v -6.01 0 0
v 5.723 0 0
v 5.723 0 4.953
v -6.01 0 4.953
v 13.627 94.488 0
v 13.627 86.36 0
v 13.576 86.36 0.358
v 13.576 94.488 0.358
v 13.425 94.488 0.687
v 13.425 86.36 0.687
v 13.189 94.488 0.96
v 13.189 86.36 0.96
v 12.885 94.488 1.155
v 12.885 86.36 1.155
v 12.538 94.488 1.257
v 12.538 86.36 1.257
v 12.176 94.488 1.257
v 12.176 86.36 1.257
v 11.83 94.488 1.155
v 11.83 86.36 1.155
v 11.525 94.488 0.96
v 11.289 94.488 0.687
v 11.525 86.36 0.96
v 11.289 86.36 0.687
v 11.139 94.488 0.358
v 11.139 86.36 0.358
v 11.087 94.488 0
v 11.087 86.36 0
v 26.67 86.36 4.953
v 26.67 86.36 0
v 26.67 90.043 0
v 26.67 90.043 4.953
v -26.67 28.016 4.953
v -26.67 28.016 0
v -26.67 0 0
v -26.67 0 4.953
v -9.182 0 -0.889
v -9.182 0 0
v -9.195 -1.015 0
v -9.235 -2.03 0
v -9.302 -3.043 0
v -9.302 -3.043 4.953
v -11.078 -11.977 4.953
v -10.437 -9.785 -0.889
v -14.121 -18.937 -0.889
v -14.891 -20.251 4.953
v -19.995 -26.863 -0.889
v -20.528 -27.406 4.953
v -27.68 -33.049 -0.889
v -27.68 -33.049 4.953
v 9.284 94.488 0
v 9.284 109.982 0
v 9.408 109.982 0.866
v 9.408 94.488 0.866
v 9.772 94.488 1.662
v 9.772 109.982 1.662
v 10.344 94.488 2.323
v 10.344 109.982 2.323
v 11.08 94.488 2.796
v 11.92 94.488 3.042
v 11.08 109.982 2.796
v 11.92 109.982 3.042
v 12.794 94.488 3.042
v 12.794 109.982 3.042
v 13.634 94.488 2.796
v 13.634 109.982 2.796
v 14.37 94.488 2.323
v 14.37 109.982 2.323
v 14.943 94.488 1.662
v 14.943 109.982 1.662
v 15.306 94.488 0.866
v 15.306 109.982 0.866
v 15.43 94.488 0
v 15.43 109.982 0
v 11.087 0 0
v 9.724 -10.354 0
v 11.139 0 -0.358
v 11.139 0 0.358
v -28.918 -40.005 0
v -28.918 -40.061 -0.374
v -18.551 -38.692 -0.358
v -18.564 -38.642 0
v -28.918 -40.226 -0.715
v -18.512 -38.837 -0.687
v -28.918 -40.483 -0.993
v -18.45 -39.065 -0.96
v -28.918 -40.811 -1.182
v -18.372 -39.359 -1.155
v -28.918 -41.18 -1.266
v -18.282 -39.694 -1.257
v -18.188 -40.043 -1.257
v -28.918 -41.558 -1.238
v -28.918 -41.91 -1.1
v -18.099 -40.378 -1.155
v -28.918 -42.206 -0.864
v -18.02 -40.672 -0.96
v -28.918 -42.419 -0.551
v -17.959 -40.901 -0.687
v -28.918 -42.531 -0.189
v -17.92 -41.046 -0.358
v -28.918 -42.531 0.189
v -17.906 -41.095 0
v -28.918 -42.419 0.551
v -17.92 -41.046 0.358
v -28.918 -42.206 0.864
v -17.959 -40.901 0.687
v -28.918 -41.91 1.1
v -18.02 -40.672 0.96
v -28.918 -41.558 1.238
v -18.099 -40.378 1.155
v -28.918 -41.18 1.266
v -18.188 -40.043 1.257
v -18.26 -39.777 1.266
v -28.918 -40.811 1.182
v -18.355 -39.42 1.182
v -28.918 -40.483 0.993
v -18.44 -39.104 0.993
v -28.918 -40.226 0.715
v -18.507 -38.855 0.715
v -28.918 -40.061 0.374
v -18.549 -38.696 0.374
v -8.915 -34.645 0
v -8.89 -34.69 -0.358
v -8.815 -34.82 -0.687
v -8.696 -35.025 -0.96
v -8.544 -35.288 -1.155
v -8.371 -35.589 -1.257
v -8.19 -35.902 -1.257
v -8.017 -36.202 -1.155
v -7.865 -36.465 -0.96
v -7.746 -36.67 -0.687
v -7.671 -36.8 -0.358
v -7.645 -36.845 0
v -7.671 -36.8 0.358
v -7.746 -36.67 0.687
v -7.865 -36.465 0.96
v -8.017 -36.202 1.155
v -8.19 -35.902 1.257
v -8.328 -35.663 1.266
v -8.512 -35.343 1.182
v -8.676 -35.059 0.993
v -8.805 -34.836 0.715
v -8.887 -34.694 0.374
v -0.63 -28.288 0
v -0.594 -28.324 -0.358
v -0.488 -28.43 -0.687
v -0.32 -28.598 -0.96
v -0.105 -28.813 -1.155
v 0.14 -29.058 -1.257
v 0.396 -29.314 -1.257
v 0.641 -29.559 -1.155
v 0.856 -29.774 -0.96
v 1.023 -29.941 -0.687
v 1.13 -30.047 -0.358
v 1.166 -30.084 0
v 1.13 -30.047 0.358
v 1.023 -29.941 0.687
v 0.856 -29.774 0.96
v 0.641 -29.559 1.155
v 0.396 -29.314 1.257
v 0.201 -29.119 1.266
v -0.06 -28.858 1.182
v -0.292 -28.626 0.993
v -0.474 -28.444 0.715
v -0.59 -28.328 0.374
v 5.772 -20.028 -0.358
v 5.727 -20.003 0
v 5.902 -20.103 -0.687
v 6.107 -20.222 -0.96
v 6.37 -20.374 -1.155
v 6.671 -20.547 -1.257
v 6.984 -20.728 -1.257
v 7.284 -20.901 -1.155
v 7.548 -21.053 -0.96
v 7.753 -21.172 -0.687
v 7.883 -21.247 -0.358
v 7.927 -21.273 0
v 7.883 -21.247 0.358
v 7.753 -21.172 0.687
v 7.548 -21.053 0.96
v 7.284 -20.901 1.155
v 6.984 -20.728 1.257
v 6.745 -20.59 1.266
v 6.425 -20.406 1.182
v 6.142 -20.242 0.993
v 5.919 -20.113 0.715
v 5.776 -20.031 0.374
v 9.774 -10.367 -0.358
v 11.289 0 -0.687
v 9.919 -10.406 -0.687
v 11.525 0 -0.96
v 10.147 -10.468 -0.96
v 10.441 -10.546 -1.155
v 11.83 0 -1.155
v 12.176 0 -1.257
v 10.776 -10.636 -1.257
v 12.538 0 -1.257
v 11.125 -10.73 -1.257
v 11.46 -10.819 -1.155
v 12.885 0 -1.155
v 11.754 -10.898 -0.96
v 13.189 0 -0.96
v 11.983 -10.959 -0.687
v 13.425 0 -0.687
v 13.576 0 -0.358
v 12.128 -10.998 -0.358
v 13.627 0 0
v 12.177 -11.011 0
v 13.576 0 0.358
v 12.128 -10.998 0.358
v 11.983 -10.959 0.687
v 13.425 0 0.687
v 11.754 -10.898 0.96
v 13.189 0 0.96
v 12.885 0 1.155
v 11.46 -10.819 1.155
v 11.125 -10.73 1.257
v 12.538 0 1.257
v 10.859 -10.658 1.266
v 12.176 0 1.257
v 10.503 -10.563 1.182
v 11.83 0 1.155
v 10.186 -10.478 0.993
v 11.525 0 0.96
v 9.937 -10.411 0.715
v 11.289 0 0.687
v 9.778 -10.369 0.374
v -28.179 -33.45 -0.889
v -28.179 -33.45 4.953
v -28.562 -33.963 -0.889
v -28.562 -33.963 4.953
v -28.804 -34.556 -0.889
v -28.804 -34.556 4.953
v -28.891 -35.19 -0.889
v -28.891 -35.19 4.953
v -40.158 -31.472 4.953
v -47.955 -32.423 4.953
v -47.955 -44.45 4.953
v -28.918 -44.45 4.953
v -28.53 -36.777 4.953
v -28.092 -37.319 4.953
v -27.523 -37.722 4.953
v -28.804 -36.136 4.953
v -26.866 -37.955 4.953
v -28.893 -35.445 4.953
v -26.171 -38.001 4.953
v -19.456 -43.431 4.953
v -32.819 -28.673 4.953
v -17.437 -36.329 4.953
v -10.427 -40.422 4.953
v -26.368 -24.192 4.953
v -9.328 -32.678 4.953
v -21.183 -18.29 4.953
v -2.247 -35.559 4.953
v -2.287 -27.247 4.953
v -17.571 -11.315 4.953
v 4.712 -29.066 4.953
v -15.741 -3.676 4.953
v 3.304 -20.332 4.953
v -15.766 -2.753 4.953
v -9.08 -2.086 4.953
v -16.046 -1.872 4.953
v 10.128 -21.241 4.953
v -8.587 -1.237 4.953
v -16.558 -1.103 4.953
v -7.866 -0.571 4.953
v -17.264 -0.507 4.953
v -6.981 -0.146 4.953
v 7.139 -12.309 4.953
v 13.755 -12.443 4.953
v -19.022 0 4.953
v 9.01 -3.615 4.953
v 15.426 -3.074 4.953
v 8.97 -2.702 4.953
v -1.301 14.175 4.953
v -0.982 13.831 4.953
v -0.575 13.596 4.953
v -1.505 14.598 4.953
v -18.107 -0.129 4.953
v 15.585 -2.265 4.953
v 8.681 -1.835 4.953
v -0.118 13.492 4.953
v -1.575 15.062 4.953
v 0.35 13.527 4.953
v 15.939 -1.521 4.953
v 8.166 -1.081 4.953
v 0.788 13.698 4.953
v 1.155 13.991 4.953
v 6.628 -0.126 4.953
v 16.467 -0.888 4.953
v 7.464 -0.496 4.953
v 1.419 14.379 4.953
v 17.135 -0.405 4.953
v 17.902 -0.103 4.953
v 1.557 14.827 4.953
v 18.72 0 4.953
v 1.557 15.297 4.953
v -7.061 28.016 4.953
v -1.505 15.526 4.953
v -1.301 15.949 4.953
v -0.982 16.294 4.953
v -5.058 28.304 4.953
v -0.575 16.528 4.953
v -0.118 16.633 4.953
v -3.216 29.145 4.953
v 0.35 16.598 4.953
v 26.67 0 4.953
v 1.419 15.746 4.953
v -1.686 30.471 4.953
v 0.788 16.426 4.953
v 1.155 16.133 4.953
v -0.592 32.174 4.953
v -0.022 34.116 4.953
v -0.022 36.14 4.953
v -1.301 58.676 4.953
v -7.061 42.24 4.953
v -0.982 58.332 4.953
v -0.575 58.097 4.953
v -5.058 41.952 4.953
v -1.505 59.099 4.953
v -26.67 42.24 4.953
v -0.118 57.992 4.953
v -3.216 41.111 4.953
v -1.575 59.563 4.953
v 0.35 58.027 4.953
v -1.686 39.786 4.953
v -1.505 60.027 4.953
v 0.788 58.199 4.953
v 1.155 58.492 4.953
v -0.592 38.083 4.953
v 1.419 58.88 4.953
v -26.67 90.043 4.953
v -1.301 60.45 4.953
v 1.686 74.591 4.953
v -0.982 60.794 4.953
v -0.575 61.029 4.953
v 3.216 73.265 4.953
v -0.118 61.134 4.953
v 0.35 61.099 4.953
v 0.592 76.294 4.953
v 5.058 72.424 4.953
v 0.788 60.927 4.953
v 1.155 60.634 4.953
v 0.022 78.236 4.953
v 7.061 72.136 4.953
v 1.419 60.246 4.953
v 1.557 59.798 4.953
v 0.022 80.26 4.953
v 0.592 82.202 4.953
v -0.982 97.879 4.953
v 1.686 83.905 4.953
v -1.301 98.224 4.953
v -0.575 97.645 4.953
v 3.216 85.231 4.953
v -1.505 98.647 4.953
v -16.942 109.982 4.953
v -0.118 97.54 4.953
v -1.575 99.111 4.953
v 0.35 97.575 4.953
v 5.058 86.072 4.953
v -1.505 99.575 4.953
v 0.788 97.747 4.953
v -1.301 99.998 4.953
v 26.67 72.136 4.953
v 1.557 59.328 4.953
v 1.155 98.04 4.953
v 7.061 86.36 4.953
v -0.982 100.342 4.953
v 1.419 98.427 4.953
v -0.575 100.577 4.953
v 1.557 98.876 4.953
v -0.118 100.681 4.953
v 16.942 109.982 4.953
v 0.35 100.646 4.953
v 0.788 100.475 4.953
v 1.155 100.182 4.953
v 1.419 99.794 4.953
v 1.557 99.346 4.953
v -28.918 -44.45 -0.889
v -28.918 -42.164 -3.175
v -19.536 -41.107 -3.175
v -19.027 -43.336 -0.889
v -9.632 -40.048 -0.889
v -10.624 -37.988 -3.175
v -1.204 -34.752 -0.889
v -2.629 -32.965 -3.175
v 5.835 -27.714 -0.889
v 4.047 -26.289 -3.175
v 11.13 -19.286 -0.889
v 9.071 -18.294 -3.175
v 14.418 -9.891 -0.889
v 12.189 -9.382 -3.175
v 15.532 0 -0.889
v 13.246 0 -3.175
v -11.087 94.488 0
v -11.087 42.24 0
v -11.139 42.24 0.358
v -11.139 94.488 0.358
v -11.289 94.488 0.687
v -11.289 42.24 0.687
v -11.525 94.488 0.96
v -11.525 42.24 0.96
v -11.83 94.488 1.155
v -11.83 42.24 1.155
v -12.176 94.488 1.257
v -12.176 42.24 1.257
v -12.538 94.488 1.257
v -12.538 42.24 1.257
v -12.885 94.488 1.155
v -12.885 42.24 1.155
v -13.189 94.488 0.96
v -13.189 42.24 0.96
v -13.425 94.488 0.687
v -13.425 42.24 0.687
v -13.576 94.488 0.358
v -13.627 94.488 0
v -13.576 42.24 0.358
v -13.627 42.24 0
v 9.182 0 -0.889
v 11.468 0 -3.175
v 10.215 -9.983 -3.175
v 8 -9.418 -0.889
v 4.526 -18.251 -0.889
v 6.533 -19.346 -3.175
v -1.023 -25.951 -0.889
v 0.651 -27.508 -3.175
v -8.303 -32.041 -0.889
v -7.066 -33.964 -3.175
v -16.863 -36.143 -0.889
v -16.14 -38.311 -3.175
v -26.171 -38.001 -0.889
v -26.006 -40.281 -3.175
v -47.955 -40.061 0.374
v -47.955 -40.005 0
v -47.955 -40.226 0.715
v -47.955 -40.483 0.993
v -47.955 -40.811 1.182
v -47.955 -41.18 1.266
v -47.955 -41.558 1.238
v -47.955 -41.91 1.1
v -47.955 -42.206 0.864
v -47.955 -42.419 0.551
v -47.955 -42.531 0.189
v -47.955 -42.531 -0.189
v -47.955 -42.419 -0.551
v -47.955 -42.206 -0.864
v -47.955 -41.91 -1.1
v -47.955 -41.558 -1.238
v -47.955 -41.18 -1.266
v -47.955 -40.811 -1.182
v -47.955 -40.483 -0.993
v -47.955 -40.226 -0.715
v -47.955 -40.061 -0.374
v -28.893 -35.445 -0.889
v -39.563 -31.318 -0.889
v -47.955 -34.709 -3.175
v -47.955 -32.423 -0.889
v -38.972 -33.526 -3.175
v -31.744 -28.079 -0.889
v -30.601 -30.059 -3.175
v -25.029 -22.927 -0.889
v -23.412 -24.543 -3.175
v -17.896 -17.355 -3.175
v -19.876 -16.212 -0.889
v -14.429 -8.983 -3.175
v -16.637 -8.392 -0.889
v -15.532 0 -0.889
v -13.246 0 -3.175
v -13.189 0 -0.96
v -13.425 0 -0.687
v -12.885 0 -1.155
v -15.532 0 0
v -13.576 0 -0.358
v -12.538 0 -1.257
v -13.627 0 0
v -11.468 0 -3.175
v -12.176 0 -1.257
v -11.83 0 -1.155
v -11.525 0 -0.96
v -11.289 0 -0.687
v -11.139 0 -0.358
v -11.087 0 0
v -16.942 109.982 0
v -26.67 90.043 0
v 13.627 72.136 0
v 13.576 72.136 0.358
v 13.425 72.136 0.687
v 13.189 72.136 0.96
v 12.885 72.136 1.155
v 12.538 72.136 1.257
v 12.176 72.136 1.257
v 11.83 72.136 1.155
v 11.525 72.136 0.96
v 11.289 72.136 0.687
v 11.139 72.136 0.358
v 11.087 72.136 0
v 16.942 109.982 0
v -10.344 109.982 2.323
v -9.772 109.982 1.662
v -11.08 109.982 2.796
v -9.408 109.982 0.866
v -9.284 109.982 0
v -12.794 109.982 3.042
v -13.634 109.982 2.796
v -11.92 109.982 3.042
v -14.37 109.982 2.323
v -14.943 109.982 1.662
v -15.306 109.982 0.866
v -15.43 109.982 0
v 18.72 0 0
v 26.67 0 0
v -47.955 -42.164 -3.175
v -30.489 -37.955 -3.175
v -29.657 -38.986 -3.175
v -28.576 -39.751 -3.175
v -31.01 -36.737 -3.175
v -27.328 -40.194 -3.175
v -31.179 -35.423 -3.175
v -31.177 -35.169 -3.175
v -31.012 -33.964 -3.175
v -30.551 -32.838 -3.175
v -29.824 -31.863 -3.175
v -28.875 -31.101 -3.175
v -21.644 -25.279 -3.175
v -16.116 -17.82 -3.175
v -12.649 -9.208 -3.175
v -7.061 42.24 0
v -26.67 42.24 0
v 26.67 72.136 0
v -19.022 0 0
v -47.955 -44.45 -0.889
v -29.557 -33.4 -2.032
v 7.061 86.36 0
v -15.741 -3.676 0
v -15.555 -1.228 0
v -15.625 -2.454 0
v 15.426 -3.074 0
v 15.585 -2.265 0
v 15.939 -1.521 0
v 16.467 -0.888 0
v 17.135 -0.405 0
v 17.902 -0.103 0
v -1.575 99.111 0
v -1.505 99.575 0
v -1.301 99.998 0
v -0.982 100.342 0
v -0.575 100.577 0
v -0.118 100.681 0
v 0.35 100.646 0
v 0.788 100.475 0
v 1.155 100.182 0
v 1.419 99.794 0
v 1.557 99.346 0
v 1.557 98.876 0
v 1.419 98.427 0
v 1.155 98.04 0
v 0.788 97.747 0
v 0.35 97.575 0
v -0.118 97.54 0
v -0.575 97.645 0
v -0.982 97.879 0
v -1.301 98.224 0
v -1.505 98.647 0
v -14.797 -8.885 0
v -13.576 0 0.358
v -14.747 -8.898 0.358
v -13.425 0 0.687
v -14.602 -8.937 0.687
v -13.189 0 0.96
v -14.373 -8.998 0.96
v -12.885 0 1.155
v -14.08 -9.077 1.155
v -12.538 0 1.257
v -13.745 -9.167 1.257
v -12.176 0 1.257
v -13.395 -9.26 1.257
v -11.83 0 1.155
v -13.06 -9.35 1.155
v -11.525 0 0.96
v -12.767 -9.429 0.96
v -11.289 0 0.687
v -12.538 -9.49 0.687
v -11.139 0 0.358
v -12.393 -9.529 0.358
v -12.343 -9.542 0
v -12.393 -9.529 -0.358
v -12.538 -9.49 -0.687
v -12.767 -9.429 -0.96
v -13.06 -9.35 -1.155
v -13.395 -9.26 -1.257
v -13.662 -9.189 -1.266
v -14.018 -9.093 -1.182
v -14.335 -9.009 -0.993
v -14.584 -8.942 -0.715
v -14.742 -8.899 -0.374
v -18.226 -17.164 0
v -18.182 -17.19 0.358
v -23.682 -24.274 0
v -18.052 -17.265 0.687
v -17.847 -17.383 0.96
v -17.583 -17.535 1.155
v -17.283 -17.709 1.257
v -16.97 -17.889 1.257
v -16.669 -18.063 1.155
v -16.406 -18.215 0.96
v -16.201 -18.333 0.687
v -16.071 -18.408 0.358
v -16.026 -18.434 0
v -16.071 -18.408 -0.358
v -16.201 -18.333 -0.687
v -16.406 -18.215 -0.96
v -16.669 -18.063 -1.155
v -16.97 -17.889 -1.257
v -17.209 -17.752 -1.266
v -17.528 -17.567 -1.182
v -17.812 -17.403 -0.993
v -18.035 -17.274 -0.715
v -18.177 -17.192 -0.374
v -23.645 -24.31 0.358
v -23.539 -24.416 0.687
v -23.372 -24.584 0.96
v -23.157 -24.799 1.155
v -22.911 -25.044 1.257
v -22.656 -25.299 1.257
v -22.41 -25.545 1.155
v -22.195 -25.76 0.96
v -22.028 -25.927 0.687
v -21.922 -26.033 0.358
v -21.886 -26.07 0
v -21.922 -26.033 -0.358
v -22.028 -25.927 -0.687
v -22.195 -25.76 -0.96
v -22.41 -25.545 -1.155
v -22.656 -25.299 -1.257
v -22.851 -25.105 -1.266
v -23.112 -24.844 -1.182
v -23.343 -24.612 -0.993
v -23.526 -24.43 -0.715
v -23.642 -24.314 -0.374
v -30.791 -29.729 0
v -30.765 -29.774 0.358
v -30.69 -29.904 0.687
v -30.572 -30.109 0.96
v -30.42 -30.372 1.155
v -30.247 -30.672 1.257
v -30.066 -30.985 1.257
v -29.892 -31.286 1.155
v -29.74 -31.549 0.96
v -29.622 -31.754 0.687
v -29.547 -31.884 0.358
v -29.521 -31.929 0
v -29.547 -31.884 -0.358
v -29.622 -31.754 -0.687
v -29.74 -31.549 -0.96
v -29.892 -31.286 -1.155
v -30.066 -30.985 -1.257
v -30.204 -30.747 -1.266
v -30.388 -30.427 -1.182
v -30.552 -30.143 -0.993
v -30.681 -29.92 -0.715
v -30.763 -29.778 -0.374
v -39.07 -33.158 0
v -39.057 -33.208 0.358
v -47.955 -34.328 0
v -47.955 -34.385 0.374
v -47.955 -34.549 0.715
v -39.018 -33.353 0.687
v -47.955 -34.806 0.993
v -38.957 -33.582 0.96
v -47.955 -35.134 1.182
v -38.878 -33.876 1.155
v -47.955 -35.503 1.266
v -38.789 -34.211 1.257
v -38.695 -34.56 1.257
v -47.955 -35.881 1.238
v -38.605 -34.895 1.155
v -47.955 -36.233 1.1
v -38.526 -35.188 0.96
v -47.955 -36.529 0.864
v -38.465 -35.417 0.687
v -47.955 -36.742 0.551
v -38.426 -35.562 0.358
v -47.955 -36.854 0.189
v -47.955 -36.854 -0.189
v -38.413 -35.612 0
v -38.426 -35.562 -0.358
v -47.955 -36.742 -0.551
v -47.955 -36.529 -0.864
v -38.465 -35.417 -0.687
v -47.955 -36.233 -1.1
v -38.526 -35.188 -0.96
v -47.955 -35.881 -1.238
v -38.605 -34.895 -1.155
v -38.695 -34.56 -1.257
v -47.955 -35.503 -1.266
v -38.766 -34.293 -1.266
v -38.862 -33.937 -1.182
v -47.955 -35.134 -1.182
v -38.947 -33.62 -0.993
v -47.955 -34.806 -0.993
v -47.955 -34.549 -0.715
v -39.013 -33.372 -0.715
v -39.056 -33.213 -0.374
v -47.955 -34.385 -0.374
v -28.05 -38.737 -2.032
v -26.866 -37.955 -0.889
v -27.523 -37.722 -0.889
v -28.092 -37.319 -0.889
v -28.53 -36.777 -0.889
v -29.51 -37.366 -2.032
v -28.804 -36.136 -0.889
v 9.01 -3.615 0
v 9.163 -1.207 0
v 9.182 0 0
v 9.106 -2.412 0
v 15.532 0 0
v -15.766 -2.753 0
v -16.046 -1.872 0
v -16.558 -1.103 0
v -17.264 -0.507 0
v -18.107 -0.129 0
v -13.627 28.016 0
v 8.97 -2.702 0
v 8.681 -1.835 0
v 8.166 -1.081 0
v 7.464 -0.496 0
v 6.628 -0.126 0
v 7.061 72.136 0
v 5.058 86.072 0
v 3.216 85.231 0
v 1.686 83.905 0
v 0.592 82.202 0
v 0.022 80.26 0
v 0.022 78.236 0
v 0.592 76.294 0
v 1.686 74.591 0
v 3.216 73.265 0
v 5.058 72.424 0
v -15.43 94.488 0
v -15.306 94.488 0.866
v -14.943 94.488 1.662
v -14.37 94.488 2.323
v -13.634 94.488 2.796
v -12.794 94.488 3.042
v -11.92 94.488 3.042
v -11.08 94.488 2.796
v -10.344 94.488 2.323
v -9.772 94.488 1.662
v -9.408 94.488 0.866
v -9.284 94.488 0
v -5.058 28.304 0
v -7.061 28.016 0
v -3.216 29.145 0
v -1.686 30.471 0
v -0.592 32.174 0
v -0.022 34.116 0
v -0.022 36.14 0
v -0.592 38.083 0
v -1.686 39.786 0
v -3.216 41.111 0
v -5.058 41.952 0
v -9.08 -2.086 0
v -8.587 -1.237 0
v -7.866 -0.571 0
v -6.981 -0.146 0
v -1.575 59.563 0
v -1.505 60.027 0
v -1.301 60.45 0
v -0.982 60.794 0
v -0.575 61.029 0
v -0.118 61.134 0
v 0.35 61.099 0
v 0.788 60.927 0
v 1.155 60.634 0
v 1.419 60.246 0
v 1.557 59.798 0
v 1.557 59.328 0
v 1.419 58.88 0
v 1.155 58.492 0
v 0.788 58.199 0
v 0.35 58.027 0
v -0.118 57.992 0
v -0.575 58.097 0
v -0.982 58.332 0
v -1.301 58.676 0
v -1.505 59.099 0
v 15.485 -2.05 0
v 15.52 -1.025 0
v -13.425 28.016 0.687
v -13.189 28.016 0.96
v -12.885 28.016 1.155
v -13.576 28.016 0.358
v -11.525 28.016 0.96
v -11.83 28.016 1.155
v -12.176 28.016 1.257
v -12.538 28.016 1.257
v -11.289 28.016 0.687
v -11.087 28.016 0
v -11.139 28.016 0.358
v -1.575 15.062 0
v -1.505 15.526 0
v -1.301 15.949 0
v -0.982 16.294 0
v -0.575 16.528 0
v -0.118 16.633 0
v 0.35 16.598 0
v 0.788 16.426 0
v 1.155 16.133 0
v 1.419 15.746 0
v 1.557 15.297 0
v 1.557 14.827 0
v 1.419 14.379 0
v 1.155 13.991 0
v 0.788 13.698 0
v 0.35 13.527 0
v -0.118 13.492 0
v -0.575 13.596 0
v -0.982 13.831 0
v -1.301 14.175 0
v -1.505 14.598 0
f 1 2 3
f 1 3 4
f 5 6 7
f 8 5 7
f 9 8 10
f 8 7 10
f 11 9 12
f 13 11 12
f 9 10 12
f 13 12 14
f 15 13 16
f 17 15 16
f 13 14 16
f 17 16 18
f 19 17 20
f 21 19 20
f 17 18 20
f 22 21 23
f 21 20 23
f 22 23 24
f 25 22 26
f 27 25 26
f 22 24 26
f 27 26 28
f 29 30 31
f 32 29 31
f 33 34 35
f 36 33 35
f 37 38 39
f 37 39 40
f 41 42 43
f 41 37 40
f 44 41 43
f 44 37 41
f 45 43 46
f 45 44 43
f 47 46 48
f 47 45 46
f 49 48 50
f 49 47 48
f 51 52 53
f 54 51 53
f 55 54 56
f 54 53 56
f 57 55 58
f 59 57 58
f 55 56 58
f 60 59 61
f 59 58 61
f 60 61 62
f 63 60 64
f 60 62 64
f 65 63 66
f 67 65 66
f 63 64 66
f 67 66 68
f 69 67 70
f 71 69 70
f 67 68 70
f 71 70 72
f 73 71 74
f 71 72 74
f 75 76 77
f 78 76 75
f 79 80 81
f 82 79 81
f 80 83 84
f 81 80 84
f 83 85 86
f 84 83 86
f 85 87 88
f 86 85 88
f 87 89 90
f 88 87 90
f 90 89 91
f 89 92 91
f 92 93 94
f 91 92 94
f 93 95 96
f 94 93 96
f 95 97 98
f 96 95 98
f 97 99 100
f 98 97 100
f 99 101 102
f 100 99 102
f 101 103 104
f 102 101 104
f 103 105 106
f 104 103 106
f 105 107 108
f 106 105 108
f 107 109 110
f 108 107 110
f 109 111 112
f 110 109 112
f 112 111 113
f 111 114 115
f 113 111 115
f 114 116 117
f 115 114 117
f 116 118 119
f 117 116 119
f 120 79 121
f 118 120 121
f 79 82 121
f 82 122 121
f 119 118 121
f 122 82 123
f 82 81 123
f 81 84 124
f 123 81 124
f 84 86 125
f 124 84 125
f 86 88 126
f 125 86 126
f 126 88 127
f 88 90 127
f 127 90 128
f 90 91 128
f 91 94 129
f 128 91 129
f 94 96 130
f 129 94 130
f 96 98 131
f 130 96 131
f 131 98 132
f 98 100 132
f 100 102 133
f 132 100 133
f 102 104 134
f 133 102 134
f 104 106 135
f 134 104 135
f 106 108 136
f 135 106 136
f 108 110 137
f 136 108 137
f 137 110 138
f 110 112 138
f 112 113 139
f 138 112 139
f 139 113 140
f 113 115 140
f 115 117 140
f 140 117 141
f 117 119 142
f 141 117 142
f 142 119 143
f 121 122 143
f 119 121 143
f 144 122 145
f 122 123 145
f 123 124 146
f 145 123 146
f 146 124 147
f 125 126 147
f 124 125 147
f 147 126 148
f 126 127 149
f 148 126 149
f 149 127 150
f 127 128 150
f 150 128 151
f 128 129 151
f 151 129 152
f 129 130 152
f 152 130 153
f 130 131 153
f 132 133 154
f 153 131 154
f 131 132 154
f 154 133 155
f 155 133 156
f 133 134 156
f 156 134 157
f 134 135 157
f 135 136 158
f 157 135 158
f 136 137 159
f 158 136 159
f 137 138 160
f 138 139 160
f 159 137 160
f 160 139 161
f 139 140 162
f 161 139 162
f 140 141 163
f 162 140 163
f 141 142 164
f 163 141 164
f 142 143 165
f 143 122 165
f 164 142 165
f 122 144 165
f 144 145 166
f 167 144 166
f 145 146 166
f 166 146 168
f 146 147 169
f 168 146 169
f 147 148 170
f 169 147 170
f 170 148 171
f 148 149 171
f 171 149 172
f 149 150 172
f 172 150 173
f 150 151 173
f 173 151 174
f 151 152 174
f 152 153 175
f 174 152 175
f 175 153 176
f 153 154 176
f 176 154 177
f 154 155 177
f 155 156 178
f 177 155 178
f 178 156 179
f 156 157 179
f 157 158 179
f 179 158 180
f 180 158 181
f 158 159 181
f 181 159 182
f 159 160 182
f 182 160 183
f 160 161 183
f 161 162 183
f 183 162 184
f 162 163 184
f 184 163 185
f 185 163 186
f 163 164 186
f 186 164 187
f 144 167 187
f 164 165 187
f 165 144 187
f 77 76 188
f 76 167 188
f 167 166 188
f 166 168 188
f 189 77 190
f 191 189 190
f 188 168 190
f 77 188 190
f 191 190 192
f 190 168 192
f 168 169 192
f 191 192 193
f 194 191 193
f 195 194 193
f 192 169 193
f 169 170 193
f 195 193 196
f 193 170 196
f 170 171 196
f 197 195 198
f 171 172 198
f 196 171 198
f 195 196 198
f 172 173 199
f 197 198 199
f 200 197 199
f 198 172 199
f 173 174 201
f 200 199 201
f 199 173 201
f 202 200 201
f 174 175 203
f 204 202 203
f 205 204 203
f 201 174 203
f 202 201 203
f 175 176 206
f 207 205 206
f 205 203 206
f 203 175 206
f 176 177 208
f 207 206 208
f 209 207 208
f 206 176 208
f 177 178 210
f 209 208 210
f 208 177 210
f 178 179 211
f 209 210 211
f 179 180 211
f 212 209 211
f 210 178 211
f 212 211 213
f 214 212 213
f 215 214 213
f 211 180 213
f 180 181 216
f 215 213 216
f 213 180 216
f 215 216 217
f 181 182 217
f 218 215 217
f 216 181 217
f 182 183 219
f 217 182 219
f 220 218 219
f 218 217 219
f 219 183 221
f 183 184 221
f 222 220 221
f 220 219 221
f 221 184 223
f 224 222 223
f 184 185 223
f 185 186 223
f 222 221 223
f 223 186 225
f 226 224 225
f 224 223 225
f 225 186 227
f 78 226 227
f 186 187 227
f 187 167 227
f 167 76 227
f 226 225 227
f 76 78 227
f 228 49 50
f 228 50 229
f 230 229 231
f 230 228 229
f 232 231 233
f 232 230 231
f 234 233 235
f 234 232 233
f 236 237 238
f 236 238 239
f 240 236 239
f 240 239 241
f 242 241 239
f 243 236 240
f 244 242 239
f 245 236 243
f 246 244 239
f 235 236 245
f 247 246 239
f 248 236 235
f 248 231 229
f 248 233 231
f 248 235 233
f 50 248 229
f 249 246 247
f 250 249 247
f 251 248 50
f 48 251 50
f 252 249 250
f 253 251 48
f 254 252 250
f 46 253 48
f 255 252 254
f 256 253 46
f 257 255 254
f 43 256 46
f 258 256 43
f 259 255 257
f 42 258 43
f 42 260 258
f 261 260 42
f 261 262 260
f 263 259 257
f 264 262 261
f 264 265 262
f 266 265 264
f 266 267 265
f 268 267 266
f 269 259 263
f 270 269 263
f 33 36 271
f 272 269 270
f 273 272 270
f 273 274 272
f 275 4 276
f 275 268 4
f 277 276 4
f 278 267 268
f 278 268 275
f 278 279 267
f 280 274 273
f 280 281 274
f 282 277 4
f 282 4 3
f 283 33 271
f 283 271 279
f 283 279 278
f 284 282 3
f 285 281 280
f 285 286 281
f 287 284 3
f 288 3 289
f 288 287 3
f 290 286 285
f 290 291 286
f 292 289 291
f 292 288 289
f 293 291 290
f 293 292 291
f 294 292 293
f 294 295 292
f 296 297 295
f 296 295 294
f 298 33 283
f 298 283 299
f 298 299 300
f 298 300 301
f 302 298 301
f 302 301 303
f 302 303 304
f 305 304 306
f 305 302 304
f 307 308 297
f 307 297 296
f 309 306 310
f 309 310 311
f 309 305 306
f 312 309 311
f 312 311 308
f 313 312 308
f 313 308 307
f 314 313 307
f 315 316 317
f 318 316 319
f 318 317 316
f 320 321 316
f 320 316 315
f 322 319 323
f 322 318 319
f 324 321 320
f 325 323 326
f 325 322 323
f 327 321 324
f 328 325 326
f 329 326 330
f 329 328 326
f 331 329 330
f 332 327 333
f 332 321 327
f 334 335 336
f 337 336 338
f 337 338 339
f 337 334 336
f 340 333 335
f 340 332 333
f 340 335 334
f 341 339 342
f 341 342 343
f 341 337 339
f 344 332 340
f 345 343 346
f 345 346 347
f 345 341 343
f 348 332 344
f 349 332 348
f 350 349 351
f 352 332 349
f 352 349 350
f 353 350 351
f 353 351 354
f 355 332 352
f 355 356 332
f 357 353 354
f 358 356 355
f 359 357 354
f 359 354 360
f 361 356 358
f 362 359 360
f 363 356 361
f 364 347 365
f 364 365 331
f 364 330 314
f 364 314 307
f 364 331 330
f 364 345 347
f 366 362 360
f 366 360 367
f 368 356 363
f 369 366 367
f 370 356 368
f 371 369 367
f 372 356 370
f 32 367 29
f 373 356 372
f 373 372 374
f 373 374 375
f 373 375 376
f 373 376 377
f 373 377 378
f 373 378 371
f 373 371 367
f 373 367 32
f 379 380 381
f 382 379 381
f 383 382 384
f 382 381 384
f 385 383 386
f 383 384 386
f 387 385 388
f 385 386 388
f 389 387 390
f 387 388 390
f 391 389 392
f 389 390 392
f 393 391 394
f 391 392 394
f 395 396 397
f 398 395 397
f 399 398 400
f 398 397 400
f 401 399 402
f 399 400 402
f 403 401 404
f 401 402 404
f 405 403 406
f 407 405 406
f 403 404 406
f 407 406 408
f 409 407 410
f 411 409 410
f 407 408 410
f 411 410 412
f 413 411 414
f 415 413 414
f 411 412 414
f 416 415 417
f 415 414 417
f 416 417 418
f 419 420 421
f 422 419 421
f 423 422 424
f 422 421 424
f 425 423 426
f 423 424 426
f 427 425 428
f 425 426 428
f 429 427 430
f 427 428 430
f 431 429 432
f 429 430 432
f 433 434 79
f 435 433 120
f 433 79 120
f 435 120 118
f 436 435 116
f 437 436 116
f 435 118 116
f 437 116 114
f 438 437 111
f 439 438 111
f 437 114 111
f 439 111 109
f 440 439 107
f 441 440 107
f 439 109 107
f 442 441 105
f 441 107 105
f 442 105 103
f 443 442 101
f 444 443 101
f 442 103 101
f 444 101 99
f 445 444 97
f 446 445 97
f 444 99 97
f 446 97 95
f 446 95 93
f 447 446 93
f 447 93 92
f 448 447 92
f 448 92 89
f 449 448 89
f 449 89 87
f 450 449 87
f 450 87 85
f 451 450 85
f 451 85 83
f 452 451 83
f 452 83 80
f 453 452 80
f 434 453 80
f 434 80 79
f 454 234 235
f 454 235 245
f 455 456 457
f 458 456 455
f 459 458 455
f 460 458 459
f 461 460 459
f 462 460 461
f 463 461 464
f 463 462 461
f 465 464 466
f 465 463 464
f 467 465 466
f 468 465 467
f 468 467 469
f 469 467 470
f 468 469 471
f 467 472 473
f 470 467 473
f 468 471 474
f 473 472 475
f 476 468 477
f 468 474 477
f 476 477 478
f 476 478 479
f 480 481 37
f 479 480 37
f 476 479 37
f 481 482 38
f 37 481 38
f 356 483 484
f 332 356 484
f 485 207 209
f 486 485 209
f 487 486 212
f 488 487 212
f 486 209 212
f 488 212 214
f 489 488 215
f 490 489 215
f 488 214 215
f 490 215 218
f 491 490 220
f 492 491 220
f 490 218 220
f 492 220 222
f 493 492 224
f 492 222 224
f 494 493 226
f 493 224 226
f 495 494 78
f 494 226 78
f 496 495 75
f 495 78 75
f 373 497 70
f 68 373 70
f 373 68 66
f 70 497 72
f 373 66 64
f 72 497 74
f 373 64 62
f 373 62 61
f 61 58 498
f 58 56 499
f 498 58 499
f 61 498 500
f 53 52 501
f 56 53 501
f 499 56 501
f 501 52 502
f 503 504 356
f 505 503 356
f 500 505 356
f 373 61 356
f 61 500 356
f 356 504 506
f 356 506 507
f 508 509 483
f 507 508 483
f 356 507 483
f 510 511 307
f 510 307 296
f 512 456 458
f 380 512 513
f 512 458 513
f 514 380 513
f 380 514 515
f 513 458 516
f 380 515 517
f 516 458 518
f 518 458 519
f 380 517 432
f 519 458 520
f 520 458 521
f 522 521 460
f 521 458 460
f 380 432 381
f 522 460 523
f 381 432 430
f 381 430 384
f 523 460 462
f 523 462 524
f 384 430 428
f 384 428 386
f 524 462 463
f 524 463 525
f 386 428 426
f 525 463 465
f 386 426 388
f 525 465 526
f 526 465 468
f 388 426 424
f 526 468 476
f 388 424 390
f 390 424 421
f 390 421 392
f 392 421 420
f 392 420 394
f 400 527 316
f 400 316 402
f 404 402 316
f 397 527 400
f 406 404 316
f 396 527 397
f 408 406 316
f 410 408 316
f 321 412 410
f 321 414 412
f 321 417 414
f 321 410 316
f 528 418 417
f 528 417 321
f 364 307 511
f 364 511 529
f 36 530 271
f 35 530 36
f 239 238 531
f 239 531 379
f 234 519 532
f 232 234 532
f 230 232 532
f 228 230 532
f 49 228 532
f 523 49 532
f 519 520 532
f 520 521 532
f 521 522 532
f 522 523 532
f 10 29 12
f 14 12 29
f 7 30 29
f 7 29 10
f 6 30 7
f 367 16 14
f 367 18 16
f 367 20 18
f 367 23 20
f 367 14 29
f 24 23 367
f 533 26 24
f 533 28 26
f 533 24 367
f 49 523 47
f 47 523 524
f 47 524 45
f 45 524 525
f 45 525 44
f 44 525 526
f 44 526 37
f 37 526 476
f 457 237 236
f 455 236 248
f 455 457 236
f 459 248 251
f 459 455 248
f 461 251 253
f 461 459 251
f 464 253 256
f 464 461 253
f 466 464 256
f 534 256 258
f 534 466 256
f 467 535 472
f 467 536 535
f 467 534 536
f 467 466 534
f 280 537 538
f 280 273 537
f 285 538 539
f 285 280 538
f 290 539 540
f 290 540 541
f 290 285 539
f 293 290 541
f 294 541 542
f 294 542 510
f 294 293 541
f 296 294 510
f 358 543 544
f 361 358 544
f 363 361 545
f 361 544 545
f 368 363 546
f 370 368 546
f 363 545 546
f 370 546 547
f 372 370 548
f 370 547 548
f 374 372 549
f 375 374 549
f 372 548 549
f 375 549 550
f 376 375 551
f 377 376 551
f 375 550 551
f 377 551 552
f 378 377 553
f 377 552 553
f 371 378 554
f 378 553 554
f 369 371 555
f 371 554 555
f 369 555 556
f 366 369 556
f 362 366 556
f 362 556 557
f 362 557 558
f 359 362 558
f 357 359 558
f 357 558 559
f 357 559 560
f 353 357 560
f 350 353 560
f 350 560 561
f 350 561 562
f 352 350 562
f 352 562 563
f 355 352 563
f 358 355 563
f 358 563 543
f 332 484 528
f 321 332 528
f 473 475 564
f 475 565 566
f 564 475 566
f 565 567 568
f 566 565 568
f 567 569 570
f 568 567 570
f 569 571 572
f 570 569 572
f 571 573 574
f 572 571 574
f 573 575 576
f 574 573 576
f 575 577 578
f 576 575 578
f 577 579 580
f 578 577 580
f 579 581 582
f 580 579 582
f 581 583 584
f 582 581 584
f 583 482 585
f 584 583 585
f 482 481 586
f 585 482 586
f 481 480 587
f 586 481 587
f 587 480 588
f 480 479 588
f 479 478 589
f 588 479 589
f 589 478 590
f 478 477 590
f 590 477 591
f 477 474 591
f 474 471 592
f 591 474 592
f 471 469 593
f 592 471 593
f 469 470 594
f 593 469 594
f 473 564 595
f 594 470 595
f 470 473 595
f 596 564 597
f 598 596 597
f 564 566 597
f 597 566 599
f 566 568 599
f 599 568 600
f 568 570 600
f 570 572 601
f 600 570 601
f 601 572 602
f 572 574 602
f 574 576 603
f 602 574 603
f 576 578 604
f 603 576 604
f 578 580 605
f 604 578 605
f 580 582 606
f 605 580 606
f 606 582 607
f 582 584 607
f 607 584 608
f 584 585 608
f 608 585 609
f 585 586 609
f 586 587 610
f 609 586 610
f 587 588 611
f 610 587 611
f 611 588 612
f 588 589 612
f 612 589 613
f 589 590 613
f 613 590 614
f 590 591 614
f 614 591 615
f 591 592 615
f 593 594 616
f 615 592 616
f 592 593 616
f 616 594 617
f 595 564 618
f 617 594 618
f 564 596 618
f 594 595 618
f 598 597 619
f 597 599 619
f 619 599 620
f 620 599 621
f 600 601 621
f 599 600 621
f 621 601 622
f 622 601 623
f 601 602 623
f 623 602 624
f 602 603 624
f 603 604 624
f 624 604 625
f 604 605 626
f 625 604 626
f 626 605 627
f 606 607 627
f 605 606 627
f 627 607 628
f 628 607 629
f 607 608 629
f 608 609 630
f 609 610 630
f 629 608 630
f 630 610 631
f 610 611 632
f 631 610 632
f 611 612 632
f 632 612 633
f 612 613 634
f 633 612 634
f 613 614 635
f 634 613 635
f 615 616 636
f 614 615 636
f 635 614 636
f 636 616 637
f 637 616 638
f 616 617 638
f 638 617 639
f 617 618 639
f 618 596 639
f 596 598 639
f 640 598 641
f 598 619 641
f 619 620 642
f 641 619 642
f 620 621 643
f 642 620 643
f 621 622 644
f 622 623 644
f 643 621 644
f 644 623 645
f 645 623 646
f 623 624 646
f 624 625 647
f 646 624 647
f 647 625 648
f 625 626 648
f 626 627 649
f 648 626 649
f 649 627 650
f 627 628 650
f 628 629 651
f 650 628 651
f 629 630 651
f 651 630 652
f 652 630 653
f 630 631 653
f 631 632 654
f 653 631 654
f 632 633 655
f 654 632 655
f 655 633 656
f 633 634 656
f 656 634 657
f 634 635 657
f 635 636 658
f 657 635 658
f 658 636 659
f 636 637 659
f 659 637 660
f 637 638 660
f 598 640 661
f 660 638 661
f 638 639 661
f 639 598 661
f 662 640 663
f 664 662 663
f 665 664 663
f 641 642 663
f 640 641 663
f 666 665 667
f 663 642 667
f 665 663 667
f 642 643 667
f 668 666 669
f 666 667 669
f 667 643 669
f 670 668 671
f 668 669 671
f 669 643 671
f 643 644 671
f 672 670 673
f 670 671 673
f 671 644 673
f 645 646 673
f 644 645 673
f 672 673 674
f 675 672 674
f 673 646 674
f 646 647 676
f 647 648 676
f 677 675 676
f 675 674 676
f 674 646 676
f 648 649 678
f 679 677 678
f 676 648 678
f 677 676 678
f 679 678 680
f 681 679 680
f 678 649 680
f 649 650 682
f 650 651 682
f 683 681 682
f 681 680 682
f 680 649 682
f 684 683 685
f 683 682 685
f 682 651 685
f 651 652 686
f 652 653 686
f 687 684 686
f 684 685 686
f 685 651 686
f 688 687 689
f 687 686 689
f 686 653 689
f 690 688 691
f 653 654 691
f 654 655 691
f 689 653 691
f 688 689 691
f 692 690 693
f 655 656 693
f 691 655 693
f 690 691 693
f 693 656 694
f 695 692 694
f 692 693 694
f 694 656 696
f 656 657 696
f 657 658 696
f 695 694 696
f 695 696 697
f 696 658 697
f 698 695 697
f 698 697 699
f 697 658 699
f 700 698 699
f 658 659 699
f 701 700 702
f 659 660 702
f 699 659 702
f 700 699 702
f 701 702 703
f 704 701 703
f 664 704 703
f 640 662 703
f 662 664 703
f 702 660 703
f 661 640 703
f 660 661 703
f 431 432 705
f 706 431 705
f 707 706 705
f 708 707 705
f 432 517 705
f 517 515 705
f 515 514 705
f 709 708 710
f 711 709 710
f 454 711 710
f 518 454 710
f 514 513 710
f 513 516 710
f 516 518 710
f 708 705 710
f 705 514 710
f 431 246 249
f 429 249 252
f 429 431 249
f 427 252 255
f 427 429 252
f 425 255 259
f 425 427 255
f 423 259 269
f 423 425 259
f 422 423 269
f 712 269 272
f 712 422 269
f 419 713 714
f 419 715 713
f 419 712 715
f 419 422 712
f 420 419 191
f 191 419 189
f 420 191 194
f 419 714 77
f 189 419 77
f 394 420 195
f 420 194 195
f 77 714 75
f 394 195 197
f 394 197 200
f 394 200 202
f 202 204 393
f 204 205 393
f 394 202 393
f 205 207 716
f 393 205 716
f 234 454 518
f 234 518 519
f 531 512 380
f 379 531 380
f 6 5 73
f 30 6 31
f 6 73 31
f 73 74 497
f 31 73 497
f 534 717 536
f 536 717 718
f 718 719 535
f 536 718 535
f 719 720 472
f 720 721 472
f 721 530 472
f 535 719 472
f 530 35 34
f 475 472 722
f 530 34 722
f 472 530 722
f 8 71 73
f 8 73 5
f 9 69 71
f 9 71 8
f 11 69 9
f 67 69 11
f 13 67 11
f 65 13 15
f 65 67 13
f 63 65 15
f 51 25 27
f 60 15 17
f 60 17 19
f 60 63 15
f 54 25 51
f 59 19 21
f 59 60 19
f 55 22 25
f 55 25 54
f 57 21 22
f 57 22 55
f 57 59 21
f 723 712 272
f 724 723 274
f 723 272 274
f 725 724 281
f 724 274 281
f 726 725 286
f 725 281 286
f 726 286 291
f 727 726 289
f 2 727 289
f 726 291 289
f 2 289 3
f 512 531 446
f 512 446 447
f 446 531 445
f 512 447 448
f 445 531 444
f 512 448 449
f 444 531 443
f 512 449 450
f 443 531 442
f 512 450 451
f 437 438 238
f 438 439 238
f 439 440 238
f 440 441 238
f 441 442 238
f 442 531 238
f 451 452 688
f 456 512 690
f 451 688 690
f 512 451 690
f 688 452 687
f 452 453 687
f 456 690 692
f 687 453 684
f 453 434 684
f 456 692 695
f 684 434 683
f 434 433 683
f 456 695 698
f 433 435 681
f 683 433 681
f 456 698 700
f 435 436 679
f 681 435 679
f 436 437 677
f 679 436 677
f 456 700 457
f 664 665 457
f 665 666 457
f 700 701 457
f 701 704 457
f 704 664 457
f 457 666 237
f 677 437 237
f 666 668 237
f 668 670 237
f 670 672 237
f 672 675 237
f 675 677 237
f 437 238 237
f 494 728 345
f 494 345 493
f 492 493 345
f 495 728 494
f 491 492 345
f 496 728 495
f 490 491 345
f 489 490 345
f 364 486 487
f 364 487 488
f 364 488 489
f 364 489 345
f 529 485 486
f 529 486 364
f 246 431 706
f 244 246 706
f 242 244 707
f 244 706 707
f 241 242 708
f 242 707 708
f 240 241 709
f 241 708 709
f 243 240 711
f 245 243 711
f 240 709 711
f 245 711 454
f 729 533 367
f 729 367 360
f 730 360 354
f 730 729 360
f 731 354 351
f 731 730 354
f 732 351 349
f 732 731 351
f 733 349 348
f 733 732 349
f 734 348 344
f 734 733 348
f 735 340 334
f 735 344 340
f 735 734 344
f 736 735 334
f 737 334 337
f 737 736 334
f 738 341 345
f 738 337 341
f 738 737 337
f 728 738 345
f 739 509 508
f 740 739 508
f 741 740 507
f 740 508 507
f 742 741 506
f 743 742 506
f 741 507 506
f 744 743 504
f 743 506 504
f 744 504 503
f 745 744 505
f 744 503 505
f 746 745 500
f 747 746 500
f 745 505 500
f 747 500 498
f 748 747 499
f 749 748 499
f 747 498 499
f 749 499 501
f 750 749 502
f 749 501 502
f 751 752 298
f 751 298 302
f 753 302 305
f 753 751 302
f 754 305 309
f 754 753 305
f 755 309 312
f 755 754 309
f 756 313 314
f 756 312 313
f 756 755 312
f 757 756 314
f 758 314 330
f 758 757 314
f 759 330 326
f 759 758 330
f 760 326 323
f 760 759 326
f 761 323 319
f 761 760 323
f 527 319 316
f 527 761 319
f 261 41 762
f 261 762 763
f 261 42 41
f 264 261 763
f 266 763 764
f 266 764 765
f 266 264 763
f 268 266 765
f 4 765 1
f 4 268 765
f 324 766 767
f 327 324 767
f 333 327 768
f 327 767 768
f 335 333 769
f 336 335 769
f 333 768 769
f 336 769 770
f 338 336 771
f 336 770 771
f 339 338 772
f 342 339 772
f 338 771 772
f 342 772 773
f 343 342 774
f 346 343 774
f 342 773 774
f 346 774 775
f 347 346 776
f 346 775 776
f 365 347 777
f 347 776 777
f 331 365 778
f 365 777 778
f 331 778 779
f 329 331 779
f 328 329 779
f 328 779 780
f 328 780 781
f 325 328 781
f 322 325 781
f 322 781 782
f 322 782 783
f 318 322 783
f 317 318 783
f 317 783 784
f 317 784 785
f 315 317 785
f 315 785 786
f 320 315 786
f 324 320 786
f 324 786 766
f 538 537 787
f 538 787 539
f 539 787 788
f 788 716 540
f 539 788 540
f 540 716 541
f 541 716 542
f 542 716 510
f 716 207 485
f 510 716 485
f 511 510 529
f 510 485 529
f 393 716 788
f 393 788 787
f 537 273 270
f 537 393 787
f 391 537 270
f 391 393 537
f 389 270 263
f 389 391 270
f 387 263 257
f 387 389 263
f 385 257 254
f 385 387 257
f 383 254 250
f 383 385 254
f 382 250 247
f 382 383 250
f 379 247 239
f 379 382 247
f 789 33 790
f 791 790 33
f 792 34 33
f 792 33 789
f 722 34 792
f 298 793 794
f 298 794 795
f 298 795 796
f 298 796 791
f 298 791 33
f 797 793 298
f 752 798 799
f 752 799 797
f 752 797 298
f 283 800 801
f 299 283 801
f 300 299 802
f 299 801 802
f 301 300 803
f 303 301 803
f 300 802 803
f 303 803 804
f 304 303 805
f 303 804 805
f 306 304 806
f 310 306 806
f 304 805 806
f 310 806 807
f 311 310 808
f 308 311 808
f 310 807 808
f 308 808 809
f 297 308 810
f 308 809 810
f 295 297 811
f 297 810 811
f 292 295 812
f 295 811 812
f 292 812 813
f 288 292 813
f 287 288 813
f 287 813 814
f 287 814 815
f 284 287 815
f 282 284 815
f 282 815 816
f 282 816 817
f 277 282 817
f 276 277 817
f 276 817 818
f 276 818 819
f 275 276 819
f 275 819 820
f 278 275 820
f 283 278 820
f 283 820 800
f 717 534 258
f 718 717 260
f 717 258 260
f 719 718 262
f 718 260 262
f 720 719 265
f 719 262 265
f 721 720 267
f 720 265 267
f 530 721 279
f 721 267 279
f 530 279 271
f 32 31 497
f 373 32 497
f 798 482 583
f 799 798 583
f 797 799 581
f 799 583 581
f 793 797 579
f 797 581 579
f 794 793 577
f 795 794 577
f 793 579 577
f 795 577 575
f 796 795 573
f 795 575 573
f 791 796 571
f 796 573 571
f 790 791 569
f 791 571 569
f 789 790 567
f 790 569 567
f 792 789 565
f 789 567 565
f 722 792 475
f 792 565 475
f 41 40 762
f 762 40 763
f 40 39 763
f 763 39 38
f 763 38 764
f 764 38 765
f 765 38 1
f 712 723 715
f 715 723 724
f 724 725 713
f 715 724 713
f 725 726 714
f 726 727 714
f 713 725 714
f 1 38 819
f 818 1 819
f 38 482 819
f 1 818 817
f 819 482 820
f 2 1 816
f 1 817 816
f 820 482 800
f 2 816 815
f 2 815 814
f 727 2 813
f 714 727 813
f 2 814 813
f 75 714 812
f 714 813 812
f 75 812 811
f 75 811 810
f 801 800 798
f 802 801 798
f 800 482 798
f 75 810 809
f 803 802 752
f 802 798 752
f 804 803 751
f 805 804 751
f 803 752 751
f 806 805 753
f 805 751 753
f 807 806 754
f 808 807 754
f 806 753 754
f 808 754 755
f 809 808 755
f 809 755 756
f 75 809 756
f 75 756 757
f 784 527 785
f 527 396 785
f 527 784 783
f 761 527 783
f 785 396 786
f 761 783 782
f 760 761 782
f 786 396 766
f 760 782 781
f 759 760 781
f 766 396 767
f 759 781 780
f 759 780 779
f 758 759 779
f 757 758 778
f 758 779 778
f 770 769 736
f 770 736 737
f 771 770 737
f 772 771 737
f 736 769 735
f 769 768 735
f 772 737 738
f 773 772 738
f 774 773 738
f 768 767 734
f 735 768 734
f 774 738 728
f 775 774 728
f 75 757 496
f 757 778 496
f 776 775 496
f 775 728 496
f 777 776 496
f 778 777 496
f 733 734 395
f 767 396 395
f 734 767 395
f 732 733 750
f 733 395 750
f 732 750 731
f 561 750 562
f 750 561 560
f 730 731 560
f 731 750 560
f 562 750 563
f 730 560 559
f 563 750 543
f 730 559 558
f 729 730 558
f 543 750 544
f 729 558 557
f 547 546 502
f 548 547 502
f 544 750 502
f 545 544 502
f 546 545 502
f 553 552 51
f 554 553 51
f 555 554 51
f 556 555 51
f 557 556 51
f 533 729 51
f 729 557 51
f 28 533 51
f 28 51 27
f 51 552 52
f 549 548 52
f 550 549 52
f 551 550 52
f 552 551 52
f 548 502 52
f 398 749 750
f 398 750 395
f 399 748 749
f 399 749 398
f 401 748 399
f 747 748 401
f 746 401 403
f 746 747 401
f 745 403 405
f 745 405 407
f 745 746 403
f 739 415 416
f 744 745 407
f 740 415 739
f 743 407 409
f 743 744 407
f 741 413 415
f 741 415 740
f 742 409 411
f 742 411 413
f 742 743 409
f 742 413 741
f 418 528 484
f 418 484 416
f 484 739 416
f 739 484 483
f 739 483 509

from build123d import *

# Parameters (mm, degrees)
F1_DEPTH       = 4.953
F3_DEPTH       = 4.954
F5_DEPTH       = 109.983
F7_DEPTH       = 15.494
F8_W           = 74.6252
F8_H           = 44.45
F9_DEPTH       = 4.953
F9_DEPTH_BACK  = 3.175
F11_R          = 1.27
F17_DEPTH      = 3.176
F17_DEPTH_BACK = 4.954
F19_D          = 3.15
F20_R          = 3.302
F21_R          = 2.5393938838
F22_SIZE       = 2.286


# Not quite as in the source:
# - a feature names something its author has since deleted; it is built from what else it names


with BuildPart() as f1:
    # F0 (on Top) → F1 (new body)
    with BuildSketch(Plane.XY):
        Polygon((-26.67, 0), (26.67, 0), (26.67, 90.043), (16.9418, 109.982), (-16.9418, 109.982), (-26.67, 90.043), align=None)
    extrude(amount=F1_DEPTH)

    # F2 (on Top) → F3 (cut, through all)
    with BuildSketch(Plane.XY):
        with BuildLine():
            Line((-26.67, 28.0162), (-7.0612, 28.0162))
            ThreePointArc((-7.0612, 28.0162), (0.0508, 35.1282), (-7.0612, 42.2402))
            Line((-7.0612, 42.2402), (-26.67, 42.2402))
            Line((-26.67, 42.2402), (-26.67, 28.0162))
        make_face()
        with BuildLine():
            Line((26.67, 86.36), (7.0612, 86.36))
            ThreePointArc((7.0612, 86.36), (-0.0508, 79.248), (7.0612, 72.136))
            Line((7.0612, 72.136), (26.67, 72.136))
            Line((26.67, 72.136), (26.67, 86.36))
        make_face()
    extrude(amount=F3_DEPTH, mode=Mode.SUBTRACT)

    # F4 (on face) → F5 (cut, through all)
    with BuildSketch(Plane.XZ):
        with BuildLine():
            ThreePointArc((-11.0871, 0), (-12.3571, 1.27), (-13.6271, 0))
            Line((-13.6271, 0), (-11.0871, 0))
        make_face()
        with BuildLine():
            ThreePointArc((13.6271, 0), (12.3571, 1.27), (11.0871, 0))
            Line((11.0871, 0), (13.6271, 0))
        make_face()
    extrude(amount=-F5_DEPTH, mode=Mode.SUBTRACT)

    # F6 (on face) → F7 (cut)
    with BuildSketch(Plane(origin=(0, 109.982, 0), x_dir=(-1, 0, 0), z_dir=(0, 1, 0))):
        with BuildLine():
            ThreePointArc((-9.2837, 0), (-12.3571, 3.0734), (-15.4305, 0))
            Line((-15.4305, 0), (-9.2837, 0))
        make_face()
        with BuildLine():
            ThreePointArc((15.4305, 0), (12.3571, 3.0734), (9.2837, 0))
            Line((9.2837, 0), (15.4305, 0))
        make_face()
    extrude(amount=-F7_DEPTH, mode=Mode.SUBTRACT)

    # F8 (on Top) → F9 (join, two sides)
    with BuildSketch(Plane.XY) as f9_sk:
        with Locations((-10.6426, -22.225)):
            Rectangle(F8_W, F8_H)
    extrude(amount=F9_DEPTH)
    extrude(f9_sk.sketch, amount=-F9_DEPTH_BACK)

    # F12: sweep along a path in F10
    with BuildLine(Plane.XY) as f12_path:
        Line((-47.9552, -41.275), (-28.9179, -41.275))
        ThreePointArc((-28.9179, -41.275), (0.2679323935, -29.1858323935), (12.3571, 0))
    # F11 (on face) → F12 (sweep, cut)
    with BuildSketch(Plane(origin=(0, 0, 0), x_dir=(-1, 0, 0), z_dir=(0, 1, 0))):
        with Locations((-12.3571, 0)):
            Circle(F11_R)
    sweep(path=f12_path.line, mode=Mode.SUBTRACT)

    # F15: sweep along a path in F13
    with BuildLine(Plane.XY) as f15_path:
        ThreePointArc((-12.3571, 0), (-22.7835420926, -25.1716579074), (-47.9552, -35.5981))
    # F14 (on face) → F15 (sweep, cut)
    with BuildSketch(Plane(origin=(0, 0, 0), x_dir=(-1, 0, 0), z_dir=(0, 1, 0))):
        with BuildLine():
            ThreePointArc((11.0871, 0), (12.3571, -1.27), (13.6271, 0))
            ThreePointArc((13.6271, 0), (12.3571, 1.27), (11.0871, 0))
        make_face()
    sweep(path=f15_path.line, mode=Mode.SUBTRACT)

    # F16 (on Top) → F17 (cut, two sides)
    with BuildSketch(Plane.XY) as f17_sk:
        with BuildLine():
            Line((-28.9179, -44.45), (26.67, -44.45))
            Line((26.67, -44.45), (26.67, 0))
            Line((26.67, 0), (15.5321, 0))
            ThreePointArc((15.5321, 0), (2.5129964237, -31.4308964237), (-28.9179, -44.45))
        make_face()
        with BuildLine():
            ThreePointArc((-28.9179, -38.1), (-1.9771316368, -26.9407683632), (9.1821, 0))
            Line((9.1821, 0), (-9.1821, 0))
            ThreePointArc((-9.1821, 0), (-14.4660215428, -19.5404250178), (-28.8776213731, -33.7549889252))
            Line((-28.8776213731, -33.7549889252), (-28.9179, -38.1))
        make_face()
        with BuildLine():
            ThreePointArc((-47.9552, -32.4231), (-25.0286061229, -22.9265938771), (-15.5321, 0))
            Line((-15.5321, 0), (-47.9552, 0))
            Line((-47.9552, 0), (-47.9552, -32.4231))
        make_face()
    extrude(amount=-F17_DEPTH, mode=Mode.SUBTRACT)
    extrude(f17_sk.sketch, amount=F17_DEPTH_BACK, mode=Mode.SUBTRACT)

    # F19 (through all)
    with Locations(Plane.XY.offset(4.953)):
        with Locations((0, 99.1108), (0, 59.563), (0, 15.0622)):
            Hole(F19_D / 2)

    # F20
    f20_edges = [f1.edges().sort_by_distance(p)[0] for p in [
        (9.1821, 0, 2.4765),
        (-9.1821, 0, 2.4765),
        (15.5321, 0, 2.4765),
        (-15.5321, 0, 2.4765),
    ]]
    fillet(f20_edges, radius=F20_R)

    # F21
    f21_edges = [f1.edges().sort_by_distance(p)[0] for p in [
        (-28.877621, -33.754989, 0.889),
        (-28.9179, -38.1, 0.889),
    ]]
    fillet(f21_edges, radius=F21_R)

    # F22
    f22_edges = [f1.edges().sort_by_distance(p)[0] for p in [
        (-38.43655, -44.45, -3.175),
        (-14.121028, -18.936792, -3.175),
        (-28.561794, -33.963255, -3.175),
        (-28.892105, -35.317366, -3.175),
        (-28.092277, -37.319249, -3.175),
        (-1.022826, -25.951394, -3.175),
        (-25.028606, -22.926594, -3.175),
        (2.512996, -31.430896, -3.175),
    ]]
    chamfer(f22_edges, length=F22_SIZE)


solid = f1.part
